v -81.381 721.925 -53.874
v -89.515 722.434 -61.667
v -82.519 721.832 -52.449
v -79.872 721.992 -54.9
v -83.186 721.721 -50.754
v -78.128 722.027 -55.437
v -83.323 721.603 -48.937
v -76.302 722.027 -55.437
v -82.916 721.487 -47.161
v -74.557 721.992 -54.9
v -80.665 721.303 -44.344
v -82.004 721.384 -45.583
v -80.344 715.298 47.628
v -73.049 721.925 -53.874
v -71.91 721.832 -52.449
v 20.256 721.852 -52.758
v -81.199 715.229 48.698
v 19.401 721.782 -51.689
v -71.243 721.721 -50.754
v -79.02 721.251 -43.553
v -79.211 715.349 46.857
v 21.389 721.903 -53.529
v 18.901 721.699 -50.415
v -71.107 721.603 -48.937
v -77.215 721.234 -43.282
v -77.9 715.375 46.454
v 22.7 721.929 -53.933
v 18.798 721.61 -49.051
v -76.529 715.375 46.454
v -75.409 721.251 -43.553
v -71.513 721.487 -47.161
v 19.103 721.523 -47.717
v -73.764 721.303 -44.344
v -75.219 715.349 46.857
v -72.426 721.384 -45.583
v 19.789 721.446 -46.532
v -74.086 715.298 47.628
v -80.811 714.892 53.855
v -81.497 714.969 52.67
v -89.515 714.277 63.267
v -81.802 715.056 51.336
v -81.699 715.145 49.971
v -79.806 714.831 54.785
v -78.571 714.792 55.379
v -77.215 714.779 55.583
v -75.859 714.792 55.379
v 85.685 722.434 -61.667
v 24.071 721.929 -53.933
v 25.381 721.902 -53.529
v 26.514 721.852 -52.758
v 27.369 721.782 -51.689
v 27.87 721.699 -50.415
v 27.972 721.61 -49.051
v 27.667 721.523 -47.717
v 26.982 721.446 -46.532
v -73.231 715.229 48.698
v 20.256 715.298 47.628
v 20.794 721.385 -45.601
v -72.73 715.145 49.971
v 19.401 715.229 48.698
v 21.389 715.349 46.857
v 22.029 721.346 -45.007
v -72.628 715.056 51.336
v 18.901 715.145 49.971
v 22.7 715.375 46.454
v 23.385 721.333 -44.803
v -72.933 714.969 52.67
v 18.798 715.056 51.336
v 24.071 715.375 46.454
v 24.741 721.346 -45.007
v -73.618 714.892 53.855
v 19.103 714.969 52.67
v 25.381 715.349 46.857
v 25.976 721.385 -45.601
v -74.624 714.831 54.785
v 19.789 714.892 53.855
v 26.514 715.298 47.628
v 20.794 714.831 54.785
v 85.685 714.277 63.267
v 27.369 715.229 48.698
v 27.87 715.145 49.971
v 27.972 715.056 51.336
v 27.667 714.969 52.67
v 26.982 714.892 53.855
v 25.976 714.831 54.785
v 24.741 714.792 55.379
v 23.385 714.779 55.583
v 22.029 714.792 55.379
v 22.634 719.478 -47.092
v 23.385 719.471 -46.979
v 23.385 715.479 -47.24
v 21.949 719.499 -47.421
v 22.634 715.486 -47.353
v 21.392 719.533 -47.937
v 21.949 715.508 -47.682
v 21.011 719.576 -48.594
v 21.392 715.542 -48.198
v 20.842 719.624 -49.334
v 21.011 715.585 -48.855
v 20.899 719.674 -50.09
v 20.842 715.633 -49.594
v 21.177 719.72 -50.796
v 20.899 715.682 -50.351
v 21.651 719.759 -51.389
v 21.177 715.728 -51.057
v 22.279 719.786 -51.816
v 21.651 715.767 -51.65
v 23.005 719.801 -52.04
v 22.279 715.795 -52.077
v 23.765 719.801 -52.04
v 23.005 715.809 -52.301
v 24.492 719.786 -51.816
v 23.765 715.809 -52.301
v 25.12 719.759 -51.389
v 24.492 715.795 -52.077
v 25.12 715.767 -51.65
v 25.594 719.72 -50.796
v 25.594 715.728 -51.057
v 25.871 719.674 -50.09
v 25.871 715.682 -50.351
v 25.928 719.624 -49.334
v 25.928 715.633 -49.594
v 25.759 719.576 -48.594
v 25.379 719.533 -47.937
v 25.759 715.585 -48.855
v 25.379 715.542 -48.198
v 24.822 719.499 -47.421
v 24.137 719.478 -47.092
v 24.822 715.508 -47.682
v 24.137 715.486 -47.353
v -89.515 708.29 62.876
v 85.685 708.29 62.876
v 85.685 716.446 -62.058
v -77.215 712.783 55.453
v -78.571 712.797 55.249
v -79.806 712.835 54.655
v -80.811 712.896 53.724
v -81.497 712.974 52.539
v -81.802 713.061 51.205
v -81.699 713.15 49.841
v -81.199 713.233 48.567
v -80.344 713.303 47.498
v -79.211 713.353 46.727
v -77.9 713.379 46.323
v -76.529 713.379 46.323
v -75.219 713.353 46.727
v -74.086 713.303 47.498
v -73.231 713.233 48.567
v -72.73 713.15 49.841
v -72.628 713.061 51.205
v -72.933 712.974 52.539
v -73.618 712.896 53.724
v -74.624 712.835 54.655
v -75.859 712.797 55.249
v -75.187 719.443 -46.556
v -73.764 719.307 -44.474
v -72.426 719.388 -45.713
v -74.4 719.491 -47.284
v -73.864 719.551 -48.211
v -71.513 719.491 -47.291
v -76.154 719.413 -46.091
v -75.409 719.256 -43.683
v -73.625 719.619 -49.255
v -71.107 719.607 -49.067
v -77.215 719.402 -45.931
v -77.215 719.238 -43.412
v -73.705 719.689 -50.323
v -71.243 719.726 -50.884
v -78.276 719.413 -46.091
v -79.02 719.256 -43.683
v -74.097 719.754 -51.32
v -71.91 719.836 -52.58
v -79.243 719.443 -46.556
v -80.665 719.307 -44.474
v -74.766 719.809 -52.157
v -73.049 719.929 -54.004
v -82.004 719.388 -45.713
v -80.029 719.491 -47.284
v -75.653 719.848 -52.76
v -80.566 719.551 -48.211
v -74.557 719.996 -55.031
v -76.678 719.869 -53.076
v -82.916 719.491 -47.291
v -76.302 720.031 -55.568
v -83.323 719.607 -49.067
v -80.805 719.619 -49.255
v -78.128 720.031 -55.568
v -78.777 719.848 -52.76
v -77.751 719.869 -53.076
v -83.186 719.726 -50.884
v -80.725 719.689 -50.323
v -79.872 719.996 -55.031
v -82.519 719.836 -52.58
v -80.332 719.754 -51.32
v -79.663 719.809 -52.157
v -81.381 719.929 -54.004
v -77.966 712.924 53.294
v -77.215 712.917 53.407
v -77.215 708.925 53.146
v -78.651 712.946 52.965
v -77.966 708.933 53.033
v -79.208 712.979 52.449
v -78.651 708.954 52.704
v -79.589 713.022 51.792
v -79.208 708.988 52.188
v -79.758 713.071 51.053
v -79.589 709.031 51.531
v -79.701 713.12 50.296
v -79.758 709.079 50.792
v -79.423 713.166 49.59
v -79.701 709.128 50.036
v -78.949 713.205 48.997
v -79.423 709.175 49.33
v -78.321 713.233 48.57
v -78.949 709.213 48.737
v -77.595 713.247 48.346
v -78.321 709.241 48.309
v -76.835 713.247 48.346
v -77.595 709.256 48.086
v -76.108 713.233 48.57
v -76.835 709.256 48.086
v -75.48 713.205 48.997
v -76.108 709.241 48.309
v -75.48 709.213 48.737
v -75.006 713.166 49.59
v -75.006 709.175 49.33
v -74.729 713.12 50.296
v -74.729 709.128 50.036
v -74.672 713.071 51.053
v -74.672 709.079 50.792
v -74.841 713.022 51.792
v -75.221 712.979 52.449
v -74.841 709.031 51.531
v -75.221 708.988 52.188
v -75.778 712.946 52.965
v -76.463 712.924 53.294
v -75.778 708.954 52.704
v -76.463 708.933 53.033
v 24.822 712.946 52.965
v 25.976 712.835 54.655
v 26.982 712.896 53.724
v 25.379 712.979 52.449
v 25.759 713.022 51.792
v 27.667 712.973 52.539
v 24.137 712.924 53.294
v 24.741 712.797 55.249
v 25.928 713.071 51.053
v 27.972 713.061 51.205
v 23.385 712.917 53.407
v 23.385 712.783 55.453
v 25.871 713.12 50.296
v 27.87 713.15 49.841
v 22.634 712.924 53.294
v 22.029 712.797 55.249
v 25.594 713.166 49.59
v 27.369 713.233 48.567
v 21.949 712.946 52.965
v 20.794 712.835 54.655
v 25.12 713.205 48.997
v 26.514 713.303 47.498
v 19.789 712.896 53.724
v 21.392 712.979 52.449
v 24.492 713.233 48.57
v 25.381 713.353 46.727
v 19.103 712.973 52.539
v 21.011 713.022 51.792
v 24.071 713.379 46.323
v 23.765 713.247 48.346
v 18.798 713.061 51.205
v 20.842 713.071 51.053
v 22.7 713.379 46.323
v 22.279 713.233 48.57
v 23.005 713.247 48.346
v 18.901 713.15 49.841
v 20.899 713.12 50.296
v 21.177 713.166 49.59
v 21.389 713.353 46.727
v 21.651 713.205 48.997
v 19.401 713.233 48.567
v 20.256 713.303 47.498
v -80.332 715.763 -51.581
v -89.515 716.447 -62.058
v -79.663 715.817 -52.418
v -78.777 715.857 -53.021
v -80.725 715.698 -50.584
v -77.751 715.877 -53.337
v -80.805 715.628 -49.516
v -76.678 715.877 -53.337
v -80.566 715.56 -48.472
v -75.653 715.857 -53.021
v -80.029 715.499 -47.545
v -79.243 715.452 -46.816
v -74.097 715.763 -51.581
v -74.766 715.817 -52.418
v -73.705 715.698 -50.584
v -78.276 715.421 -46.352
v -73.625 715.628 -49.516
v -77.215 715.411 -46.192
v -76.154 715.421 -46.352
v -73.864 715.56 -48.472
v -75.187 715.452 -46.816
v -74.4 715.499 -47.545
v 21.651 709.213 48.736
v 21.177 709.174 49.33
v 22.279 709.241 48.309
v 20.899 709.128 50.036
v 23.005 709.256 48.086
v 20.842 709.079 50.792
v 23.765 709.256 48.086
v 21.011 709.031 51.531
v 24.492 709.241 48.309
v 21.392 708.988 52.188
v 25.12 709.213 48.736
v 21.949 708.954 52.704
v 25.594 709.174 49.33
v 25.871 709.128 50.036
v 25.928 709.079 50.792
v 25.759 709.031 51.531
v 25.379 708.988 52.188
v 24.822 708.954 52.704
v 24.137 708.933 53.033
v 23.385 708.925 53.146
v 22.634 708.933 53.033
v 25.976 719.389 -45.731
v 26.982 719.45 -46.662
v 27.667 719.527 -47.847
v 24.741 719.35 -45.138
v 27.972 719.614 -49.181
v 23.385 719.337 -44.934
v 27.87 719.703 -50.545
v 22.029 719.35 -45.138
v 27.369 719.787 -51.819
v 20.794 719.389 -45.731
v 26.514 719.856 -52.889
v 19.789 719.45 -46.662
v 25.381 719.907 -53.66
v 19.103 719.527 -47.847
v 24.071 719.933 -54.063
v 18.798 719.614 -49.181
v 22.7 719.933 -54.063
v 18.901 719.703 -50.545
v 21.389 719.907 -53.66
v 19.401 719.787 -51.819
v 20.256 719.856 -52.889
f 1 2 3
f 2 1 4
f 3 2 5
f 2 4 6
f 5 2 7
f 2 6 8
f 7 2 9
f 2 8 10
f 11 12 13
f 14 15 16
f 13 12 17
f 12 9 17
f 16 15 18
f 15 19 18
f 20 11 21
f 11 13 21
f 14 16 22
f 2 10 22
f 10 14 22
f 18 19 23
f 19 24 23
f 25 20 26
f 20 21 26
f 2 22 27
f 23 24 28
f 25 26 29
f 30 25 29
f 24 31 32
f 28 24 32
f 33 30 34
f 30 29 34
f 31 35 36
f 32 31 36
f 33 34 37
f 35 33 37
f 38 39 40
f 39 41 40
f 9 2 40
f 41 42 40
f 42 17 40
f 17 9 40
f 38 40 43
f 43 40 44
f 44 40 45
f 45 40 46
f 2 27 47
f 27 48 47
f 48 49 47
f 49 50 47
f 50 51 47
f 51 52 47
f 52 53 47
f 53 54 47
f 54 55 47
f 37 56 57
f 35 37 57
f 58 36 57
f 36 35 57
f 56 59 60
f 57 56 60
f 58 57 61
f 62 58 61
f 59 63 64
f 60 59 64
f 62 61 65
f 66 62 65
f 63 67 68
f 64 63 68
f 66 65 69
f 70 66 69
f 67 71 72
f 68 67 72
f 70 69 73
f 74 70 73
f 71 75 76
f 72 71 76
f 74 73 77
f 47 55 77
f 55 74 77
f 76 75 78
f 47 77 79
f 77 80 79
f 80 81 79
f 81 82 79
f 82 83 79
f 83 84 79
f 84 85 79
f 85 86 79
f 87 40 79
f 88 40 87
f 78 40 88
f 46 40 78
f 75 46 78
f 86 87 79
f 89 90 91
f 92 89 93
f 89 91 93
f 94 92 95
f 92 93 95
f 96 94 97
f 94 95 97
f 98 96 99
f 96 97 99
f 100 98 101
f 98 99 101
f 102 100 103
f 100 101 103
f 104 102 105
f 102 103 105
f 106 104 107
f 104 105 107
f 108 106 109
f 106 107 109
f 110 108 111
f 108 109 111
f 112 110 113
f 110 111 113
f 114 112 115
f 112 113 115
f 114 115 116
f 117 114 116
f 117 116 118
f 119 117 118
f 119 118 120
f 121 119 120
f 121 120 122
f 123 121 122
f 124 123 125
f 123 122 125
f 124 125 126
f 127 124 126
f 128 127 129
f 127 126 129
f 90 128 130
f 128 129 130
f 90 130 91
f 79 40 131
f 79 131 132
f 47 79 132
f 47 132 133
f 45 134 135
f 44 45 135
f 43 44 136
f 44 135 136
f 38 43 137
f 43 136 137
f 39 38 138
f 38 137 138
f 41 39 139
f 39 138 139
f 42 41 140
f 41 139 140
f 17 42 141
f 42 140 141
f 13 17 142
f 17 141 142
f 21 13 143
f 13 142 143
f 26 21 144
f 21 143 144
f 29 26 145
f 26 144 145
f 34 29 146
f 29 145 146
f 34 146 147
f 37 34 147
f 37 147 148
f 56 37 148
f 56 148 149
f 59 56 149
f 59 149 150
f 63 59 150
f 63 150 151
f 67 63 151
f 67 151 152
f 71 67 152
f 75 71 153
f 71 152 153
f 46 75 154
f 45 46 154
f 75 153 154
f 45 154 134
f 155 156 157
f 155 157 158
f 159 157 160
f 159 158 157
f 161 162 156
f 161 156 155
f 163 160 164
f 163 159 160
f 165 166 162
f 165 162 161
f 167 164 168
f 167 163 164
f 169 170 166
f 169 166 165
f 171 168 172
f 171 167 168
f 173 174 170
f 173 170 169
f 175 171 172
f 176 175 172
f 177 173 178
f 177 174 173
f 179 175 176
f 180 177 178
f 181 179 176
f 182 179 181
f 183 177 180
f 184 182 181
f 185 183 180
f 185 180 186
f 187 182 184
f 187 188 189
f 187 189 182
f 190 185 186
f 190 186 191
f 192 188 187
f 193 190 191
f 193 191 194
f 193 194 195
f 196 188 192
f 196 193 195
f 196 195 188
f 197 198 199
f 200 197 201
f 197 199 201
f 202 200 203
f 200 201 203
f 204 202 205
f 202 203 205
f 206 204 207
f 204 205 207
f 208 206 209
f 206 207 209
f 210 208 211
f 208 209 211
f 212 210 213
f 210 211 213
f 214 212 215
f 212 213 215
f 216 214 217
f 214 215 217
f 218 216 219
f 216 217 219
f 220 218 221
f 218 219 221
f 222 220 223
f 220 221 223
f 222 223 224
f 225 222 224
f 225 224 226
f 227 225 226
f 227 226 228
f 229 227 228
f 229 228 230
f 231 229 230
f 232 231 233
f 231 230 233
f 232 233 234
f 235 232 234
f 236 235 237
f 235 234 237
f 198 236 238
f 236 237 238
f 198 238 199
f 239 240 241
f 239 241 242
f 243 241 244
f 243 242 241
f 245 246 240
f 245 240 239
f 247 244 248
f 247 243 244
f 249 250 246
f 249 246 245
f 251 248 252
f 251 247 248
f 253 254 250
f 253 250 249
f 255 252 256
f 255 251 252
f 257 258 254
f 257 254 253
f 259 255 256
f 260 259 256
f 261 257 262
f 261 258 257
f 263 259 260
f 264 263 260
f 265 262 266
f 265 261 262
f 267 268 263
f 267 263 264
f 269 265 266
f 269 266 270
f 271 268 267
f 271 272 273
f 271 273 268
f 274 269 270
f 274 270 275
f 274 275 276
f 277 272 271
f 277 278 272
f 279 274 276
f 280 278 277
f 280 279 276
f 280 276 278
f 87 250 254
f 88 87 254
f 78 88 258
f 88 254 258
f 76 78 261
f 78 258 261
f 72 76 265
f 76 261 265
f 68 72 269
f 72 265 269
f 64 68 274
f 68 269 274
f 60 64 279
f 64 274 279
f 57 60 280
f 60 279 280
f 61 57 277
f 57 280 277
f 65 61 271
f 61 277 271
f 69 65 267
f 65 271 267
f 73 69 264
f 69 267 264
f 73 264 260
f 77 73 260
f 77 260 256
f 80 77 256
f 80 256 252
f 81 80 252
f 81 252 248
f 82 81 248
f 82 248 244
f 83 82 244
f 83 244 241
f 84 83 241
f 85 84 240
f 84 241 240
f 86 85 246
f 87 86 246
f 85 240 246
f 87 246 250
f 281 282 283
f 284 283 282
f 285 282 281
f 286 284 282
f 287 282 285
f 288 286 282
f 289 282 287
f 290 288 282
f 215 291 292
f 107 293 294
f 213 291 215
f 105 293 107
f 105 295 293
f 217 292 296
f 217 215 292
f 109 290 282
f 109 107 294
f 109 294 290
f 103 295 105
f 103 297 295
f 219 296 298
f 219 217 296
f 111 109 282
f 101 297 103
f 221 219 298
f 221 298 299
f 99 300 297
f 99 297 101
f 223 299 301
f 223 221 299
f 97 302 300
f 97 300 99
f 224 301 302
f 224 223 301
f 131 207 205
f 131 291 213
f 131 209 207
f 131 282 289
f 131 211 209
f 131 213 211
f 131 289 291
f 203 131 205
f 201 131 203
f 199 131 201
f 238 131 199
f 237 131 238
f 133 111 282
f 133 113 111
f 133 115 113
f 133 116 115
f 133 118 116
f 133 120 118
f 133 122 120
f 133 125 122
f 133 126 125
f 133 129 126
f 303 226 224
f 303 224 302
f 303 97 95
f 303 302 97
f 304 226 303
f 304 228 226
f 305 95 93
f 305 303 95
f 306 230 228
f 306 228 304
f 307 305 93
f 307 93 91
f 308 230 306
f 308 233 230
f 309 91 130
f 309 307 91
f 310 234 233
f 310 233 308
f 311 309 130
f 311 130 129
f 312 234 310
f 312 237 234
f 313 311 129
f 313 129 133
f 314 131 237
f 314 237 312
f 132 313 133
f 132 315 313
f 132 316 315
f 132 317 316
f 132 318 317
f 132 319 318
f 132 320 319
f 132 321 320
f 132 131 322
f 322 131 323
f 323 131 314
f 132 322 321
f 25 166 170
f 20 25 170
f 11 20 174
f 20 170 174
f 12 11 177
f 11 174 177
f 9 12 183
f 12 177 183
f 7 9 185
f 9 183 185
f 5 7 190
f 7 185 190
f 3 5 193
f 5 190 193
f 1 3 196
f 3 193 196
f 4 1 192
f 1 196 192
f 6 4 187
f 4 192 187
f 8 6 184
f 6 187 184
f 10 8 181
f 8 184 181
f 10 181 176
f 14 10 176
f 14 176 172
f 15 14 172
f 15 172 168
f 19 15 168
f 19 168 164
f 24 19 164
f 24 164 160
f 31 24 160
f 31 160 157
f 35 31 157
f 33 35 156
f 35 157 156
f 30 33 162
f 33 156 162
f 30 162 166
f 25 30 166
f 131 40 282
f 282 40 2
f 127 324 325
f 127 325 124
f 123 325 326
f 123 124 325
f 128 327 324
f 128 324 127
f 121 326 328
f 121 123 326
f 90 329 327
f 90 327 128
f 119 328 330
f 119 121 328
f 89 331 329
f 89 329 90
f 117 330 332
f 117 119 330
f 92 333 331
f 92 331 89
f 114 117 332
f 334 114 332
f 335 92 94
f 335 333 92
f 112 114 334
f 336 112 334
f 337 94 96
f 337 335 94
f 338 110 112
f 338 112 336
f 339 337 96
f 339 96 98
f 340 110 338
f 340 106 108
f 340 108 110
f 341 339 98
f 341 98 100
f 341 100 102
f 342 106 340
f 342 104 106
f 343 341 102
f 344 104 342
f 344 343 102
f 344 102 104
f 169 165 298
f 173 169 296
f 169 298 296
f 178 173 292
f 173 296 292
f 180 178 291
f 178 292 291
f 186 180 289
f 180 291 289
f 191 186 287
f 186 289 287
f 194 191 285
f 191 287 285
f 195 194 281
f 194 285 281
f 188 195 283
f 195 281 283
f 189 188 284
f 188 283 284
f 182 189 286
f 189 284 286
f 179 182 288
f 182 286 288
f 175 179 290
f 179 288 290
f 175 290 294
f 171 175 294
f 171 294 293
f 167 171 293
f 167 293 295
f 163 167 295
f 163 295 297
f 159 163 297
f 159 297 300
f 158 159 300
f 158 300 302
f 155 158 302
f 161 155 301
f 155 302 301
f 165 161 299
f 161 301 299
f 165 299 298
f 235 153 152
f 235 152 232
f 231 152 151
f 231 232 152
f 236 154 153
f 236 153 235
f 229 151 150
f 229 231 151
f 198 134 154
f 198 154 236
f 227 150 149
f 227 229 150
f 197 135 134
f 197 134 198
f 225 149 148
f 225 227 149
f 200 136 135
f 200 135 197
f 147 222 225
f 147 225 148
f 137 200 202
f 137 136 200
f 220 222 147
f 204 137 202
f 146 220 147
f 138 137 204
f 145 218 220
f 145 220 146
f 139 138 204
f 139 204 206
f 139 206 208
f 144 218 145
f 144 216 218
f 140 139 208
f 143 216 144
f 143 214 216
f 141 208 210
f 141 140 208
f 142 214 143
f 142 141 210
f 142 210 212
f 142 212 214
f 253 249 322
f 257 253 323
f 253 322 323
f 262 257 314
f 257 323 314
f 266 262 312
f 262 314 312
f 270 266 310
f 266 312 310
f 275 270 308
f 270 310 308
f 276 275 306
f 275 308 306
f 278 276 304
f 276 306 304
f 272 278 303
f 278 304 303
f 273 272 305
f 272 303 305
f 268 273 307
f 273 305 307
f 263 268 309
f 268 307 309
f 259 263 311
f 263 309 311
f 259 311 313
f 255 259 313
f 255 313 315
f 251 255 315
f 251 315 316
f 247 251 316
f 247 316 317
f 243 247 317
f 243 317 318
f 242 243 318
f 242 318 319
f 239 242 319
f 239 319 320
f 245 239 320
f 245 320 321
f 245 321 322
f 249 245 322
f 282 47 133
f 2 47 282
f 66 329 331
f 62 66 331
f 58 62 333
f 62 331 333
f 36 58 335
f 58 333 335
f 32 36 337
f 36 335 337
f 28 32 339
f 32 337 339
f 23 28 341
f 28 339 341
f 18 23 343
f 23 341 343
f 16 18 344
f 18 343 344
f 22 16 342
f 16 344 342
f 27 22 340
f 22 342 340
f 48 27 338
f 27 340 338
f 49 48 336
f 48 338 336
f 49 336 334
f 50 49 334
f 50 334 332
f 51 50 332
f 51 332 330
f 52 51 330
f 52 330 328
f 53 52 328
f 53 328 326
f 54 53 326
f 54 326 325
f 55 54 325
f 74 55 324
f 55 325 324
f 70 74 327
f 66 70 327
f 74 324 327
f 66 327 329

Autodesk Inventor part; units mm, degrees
ref_plane "YZ Plane" through (0, 0, 0) normal (1, 0, 0) x (0, 1, 0)
ref_plane "XZ Plane" through (0, 0, 0) normal (0, 1, 0) x (-1, 0, 0)
ref_plane "XY Plane" through (0, 0, 0) normal (0, 0, 1) x (1, 0, 0)
ref_plane "Work Plane1" through (-11.5353, 732.2171, -211.5196) normal (-0.0000012, -0.9978756, -0.0651475) x (1, -0.0000012, -0.0000001)
sketch "Sketch2" plane through (-11.5353, 732.2171, -211.5196) normal (-0.0000012, -0.9978756, -0.0651475) x (1, -0.0000012, -0.0000001)
  line L0 (47.2205, 275.3712) -> (-77.9795, 275.3712)
  line L1 (-77.9795, 275.3712) -> (-77.9795, 150.1712)
  line L2 (-77.9795, 150.1712) -> (47.2205, 150.1712)
  line L3 (47.2205, 150.1712) -> (47.2205, 275.3712) construction
  line L4 (47.2205, 275.3712) -> (97.2205, 275.3712)
  line L5 (97.2205, 275.3712) -> (97.2205, 150.1712)
  line L6 (97.2205, 150.1712) -> (47.2205, 150.1712)
  line L7 (34.9205, 141.5153) -> (34.9205, 309.2543) construction
  line L8 (-65.6795, 309.2543) -> (-65.6795, 110.7061) construction
  line L9 (72.2205, 263.0712) -> (-113.8811, 263.0712) construction
  line L10 (72.2205, 162.4712) -> (-118.8511, 162.4712) construction
  point P0 (11.5362, 258.7723)
  point P1 (-138.0714, 537.573)
  point P2 (-211.9698, 678.1667)
  point P3 (34.9205, 263.0712)
  point P4 (34.9205, 162.4712)
  point P5 (-65.6795, 162.4712)
  point P6 (-65.6795, 263.0712)
  dimension "d15" = 125.2
  dimension "d16" = 125.2
  dimension "d23" = 50
  dimension "d30" = 12.3
  dimension "d31" = 100.6
  dimension "d32" = 12.3
  dimension "d33" = 100.6
extrude "Extrusion2" add sketch "Sketch2" along normal blind 6
hole "Hole1" at (23.3852, 715.0787, 50.9927) at (23.3852, 721.6325, -49.3936) at (-77.2148, 715.0788, 50.9927) direction (-0.0000012, -0.9978756, -0.0651475) diameter 5.1 end through all counterbore diameter 9.2 counterbore depth 2
hole "Hole2" at (-77.2148, 721.6326, -49.3935) direction (-0.0000012, -0.9978756, -0.0651475) diameter 7.2 end through all counterbore diameter 12.25 counterbore depth 2
properties part number "X axis carriage"
